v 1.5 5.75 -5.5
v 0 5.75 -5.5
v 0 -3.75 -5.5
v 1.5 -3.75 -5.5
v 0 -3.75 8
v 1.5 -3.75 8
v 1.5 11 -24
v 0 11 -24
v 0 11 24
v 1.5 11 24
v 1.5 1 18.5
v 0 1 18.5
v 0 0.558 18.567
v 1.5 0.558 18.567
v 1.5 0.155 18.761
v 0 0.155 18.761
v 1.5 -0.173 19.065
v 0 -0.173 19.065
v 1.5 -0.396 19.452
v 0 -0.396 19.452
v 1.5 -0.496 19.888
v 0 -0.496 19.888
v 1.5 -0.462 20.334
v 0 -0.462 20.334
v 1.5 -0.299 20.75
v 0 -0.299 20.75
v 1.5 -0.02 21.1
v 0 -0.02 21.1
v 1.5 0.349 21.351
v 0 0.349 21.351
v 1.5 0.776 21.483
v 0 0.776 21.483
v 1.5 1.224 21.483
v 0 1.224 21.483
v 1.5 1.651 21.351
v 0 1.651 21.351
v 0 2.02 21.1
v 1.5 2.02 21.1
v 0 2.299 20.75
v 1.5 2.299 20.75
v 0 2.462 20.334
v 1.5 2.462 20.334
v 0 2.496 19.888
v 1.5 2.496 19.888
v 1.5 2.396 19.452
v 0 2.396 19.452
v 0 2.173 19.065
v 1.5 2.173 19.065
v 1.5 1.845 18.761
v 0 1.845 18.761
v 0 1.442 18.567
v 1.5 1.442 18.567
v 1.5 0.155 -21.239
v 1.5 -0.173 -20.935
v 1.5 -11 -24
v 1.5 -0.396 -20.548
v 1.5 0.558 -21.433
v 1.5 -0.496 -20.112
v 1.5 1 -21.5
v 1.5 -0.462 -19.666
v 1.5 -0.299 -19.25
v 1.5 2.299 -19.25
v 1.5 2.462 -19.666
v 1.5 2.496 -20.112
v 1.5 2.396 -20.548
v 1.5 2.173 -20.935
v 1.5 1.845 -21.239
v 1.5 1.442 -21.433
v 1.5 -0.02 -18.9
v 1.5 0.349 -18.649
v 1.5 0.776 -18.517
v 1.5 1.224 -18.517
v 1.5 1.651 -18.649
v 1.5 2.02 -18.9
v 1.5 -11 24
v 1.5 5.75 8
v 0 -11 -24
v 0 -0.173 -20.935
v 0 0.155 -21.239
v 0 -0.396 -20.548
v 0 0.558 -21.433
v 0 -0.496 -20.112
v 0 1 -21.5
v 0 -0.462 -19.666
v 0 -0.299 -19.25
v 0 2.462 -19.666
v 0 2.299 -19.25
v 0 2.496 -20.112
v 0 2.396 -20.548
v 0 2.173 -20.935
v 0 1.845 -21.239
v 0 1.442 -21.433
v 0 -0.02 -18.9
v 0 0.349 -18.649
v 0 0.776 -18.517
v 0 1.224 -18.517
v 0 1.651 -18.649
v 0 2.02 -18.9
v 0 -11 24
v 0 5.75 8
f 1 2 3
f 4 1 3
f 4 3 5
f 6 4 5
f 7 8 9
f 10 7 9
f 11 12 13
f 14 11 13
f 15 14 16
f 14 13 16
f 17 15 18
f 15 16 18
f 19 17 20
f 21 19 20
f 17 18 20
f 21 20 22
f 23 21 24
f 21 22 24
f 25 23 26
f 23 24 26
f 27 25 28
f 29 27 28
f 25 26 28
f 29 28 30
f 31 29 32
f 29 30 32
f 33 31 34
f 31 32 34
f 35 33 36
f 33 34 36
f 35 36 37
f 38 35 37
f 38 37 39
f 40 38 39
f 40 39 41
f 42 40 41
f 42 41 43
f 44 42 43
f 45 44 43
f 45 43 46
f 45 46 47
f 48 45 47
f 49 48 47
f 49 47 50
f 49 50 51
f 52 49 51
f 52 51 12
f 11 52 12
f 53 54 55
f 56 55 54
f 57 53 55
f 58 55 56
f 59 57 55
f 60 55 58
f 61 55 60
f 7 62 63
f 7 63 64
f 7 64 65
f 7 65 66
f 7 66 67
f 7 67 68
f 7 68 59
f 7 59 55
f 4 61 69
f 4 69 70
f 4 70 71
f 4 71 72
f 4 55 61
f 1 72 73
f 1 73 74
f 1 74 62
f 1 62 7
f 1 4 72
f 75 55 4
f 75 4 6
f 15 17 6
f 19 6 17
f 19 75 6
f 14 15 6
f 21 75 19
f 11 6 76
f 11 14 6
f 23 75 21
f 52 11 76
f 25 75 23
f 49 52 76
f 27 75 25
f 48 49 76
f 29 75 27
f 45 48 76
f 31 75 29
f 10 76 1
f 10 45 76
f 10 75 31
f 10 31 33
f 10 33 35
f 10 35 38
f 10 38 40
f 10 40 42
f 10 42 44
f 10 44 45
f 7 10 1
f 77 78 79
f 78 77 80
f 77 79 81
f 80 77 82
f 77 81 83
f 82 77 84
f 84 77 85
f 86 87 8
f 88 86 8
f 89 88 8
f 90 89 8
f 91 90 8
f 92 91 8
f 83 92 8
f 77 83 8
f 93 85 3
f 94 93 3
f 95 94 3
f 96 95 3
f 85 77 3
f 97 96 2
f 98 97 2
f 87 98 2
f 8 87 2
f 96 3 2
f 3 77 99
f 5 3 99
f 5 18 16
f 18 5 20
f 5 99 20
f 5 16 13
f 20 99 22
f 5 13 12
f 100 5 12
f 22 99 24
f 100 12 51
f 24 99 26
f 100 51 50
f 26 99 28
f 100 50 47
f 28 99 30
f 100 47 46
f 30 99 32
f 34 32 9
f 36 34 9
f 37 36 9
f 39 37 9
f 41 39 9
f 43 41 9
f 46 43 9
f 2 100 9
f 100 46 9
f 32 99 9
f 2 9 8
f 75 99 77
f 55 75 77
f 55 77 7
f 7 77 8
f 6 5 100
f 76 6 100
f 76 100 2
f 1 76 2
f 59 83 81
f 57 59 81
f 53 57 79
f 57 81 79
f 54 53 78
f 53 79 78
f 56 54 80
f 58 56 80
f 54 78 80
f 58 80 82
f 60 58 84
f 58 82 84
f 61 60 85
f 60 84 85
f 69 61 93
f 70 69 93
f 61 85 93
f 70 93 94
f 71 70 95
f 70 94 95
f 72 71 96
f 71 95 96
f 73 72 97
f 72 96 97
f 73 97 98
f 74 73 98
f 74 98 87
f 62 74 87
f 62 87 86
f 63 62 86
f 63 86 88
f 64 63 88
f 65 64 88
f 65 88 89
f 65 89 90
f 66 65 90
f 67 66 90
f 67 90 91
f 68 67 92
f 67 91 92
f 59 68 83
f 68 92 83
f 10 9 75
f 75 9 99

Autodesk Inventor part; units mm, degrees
ref_plane "YZ Plane" through (0, 0, 0) normal (1, 0, 0) x (0, 1, 0)
ref_plane "XZ Plane" through (0, 0, 0) normal (0, 1, 0) x (-1, 0, 0)
ref_plane "XY Plane" through (0, 0, 0) normal (0, 0, 1) x (1, 0, 0)
sketch "スケッチ1" plane through (0, 0, 0) normal (1, 0, 0) x (0, 1, 0)
  line L0 (-11, -24) -> (11, -24)
  line L1 (11, -24) -> (11, 24)
  line L2 (11, 24) -> (-11, 24)
  line L3 (-11, 24) -> (-11, -24)
  line L4 (-11, -24) -> (11, 24) construction
  line L5 (11, -24) -> (-11, 24) construction
  point P0 (0, 0)
  dimension "d0" = 22
  dimension "d1" = 48
extrude "押し出し1" add sketch "スケッチ1" along normal blind 1.5
sketch "スケッチ2" plane through (1.5, 0, 0) normal (1, 0, 0) x (0, 0, -1)
  line L0 (-24, 11) -> (-24, -11) projected
  line L1 (24, -11) -> (24, 11) projected
  line L2 (-24, -11) -> (24, -11) projected
  point P0 (0, 0)
  point P1 (-20, 1)
  point P2 (20, 1)
  dimension "d4" = 4
  dimension "d5" = 4
  dimension "d6" = 12
hole "穴1" at (1.5, 1, 20) at (1.5, 1, -20) direction (-1, 0, 0) diameter 3 end through all
sketch "スケッチ3" plane through (0, 0, 0) normal (-1, 0, 0) x (0, 0, 1)
  line L0 (-5.5, -3.75) -> (8, -3.75)
  line L1 (8, -3.75) -> (8, 5.75)
  line L2 (8, 5.75) -> (-5.5, 5.75)
  line L3 (-5.5, 5.75) -> (-5.5, -3.75)
  line L4 (24, -11) -> (-24, -11) projected
  line L5 (-24, -11) -> (-24, 11) projected
  point P0 (0, 0)
  dimension "d14" = 7.25
  dimension "d15" = 18.5
  dimension "d16" = 32
  dimension "d17" = 16.75
extrude "押し出し2" cut sketch "スケッチ3" against normal blind 1.5
properties part number "sensor_pcb" material "ガラス"
